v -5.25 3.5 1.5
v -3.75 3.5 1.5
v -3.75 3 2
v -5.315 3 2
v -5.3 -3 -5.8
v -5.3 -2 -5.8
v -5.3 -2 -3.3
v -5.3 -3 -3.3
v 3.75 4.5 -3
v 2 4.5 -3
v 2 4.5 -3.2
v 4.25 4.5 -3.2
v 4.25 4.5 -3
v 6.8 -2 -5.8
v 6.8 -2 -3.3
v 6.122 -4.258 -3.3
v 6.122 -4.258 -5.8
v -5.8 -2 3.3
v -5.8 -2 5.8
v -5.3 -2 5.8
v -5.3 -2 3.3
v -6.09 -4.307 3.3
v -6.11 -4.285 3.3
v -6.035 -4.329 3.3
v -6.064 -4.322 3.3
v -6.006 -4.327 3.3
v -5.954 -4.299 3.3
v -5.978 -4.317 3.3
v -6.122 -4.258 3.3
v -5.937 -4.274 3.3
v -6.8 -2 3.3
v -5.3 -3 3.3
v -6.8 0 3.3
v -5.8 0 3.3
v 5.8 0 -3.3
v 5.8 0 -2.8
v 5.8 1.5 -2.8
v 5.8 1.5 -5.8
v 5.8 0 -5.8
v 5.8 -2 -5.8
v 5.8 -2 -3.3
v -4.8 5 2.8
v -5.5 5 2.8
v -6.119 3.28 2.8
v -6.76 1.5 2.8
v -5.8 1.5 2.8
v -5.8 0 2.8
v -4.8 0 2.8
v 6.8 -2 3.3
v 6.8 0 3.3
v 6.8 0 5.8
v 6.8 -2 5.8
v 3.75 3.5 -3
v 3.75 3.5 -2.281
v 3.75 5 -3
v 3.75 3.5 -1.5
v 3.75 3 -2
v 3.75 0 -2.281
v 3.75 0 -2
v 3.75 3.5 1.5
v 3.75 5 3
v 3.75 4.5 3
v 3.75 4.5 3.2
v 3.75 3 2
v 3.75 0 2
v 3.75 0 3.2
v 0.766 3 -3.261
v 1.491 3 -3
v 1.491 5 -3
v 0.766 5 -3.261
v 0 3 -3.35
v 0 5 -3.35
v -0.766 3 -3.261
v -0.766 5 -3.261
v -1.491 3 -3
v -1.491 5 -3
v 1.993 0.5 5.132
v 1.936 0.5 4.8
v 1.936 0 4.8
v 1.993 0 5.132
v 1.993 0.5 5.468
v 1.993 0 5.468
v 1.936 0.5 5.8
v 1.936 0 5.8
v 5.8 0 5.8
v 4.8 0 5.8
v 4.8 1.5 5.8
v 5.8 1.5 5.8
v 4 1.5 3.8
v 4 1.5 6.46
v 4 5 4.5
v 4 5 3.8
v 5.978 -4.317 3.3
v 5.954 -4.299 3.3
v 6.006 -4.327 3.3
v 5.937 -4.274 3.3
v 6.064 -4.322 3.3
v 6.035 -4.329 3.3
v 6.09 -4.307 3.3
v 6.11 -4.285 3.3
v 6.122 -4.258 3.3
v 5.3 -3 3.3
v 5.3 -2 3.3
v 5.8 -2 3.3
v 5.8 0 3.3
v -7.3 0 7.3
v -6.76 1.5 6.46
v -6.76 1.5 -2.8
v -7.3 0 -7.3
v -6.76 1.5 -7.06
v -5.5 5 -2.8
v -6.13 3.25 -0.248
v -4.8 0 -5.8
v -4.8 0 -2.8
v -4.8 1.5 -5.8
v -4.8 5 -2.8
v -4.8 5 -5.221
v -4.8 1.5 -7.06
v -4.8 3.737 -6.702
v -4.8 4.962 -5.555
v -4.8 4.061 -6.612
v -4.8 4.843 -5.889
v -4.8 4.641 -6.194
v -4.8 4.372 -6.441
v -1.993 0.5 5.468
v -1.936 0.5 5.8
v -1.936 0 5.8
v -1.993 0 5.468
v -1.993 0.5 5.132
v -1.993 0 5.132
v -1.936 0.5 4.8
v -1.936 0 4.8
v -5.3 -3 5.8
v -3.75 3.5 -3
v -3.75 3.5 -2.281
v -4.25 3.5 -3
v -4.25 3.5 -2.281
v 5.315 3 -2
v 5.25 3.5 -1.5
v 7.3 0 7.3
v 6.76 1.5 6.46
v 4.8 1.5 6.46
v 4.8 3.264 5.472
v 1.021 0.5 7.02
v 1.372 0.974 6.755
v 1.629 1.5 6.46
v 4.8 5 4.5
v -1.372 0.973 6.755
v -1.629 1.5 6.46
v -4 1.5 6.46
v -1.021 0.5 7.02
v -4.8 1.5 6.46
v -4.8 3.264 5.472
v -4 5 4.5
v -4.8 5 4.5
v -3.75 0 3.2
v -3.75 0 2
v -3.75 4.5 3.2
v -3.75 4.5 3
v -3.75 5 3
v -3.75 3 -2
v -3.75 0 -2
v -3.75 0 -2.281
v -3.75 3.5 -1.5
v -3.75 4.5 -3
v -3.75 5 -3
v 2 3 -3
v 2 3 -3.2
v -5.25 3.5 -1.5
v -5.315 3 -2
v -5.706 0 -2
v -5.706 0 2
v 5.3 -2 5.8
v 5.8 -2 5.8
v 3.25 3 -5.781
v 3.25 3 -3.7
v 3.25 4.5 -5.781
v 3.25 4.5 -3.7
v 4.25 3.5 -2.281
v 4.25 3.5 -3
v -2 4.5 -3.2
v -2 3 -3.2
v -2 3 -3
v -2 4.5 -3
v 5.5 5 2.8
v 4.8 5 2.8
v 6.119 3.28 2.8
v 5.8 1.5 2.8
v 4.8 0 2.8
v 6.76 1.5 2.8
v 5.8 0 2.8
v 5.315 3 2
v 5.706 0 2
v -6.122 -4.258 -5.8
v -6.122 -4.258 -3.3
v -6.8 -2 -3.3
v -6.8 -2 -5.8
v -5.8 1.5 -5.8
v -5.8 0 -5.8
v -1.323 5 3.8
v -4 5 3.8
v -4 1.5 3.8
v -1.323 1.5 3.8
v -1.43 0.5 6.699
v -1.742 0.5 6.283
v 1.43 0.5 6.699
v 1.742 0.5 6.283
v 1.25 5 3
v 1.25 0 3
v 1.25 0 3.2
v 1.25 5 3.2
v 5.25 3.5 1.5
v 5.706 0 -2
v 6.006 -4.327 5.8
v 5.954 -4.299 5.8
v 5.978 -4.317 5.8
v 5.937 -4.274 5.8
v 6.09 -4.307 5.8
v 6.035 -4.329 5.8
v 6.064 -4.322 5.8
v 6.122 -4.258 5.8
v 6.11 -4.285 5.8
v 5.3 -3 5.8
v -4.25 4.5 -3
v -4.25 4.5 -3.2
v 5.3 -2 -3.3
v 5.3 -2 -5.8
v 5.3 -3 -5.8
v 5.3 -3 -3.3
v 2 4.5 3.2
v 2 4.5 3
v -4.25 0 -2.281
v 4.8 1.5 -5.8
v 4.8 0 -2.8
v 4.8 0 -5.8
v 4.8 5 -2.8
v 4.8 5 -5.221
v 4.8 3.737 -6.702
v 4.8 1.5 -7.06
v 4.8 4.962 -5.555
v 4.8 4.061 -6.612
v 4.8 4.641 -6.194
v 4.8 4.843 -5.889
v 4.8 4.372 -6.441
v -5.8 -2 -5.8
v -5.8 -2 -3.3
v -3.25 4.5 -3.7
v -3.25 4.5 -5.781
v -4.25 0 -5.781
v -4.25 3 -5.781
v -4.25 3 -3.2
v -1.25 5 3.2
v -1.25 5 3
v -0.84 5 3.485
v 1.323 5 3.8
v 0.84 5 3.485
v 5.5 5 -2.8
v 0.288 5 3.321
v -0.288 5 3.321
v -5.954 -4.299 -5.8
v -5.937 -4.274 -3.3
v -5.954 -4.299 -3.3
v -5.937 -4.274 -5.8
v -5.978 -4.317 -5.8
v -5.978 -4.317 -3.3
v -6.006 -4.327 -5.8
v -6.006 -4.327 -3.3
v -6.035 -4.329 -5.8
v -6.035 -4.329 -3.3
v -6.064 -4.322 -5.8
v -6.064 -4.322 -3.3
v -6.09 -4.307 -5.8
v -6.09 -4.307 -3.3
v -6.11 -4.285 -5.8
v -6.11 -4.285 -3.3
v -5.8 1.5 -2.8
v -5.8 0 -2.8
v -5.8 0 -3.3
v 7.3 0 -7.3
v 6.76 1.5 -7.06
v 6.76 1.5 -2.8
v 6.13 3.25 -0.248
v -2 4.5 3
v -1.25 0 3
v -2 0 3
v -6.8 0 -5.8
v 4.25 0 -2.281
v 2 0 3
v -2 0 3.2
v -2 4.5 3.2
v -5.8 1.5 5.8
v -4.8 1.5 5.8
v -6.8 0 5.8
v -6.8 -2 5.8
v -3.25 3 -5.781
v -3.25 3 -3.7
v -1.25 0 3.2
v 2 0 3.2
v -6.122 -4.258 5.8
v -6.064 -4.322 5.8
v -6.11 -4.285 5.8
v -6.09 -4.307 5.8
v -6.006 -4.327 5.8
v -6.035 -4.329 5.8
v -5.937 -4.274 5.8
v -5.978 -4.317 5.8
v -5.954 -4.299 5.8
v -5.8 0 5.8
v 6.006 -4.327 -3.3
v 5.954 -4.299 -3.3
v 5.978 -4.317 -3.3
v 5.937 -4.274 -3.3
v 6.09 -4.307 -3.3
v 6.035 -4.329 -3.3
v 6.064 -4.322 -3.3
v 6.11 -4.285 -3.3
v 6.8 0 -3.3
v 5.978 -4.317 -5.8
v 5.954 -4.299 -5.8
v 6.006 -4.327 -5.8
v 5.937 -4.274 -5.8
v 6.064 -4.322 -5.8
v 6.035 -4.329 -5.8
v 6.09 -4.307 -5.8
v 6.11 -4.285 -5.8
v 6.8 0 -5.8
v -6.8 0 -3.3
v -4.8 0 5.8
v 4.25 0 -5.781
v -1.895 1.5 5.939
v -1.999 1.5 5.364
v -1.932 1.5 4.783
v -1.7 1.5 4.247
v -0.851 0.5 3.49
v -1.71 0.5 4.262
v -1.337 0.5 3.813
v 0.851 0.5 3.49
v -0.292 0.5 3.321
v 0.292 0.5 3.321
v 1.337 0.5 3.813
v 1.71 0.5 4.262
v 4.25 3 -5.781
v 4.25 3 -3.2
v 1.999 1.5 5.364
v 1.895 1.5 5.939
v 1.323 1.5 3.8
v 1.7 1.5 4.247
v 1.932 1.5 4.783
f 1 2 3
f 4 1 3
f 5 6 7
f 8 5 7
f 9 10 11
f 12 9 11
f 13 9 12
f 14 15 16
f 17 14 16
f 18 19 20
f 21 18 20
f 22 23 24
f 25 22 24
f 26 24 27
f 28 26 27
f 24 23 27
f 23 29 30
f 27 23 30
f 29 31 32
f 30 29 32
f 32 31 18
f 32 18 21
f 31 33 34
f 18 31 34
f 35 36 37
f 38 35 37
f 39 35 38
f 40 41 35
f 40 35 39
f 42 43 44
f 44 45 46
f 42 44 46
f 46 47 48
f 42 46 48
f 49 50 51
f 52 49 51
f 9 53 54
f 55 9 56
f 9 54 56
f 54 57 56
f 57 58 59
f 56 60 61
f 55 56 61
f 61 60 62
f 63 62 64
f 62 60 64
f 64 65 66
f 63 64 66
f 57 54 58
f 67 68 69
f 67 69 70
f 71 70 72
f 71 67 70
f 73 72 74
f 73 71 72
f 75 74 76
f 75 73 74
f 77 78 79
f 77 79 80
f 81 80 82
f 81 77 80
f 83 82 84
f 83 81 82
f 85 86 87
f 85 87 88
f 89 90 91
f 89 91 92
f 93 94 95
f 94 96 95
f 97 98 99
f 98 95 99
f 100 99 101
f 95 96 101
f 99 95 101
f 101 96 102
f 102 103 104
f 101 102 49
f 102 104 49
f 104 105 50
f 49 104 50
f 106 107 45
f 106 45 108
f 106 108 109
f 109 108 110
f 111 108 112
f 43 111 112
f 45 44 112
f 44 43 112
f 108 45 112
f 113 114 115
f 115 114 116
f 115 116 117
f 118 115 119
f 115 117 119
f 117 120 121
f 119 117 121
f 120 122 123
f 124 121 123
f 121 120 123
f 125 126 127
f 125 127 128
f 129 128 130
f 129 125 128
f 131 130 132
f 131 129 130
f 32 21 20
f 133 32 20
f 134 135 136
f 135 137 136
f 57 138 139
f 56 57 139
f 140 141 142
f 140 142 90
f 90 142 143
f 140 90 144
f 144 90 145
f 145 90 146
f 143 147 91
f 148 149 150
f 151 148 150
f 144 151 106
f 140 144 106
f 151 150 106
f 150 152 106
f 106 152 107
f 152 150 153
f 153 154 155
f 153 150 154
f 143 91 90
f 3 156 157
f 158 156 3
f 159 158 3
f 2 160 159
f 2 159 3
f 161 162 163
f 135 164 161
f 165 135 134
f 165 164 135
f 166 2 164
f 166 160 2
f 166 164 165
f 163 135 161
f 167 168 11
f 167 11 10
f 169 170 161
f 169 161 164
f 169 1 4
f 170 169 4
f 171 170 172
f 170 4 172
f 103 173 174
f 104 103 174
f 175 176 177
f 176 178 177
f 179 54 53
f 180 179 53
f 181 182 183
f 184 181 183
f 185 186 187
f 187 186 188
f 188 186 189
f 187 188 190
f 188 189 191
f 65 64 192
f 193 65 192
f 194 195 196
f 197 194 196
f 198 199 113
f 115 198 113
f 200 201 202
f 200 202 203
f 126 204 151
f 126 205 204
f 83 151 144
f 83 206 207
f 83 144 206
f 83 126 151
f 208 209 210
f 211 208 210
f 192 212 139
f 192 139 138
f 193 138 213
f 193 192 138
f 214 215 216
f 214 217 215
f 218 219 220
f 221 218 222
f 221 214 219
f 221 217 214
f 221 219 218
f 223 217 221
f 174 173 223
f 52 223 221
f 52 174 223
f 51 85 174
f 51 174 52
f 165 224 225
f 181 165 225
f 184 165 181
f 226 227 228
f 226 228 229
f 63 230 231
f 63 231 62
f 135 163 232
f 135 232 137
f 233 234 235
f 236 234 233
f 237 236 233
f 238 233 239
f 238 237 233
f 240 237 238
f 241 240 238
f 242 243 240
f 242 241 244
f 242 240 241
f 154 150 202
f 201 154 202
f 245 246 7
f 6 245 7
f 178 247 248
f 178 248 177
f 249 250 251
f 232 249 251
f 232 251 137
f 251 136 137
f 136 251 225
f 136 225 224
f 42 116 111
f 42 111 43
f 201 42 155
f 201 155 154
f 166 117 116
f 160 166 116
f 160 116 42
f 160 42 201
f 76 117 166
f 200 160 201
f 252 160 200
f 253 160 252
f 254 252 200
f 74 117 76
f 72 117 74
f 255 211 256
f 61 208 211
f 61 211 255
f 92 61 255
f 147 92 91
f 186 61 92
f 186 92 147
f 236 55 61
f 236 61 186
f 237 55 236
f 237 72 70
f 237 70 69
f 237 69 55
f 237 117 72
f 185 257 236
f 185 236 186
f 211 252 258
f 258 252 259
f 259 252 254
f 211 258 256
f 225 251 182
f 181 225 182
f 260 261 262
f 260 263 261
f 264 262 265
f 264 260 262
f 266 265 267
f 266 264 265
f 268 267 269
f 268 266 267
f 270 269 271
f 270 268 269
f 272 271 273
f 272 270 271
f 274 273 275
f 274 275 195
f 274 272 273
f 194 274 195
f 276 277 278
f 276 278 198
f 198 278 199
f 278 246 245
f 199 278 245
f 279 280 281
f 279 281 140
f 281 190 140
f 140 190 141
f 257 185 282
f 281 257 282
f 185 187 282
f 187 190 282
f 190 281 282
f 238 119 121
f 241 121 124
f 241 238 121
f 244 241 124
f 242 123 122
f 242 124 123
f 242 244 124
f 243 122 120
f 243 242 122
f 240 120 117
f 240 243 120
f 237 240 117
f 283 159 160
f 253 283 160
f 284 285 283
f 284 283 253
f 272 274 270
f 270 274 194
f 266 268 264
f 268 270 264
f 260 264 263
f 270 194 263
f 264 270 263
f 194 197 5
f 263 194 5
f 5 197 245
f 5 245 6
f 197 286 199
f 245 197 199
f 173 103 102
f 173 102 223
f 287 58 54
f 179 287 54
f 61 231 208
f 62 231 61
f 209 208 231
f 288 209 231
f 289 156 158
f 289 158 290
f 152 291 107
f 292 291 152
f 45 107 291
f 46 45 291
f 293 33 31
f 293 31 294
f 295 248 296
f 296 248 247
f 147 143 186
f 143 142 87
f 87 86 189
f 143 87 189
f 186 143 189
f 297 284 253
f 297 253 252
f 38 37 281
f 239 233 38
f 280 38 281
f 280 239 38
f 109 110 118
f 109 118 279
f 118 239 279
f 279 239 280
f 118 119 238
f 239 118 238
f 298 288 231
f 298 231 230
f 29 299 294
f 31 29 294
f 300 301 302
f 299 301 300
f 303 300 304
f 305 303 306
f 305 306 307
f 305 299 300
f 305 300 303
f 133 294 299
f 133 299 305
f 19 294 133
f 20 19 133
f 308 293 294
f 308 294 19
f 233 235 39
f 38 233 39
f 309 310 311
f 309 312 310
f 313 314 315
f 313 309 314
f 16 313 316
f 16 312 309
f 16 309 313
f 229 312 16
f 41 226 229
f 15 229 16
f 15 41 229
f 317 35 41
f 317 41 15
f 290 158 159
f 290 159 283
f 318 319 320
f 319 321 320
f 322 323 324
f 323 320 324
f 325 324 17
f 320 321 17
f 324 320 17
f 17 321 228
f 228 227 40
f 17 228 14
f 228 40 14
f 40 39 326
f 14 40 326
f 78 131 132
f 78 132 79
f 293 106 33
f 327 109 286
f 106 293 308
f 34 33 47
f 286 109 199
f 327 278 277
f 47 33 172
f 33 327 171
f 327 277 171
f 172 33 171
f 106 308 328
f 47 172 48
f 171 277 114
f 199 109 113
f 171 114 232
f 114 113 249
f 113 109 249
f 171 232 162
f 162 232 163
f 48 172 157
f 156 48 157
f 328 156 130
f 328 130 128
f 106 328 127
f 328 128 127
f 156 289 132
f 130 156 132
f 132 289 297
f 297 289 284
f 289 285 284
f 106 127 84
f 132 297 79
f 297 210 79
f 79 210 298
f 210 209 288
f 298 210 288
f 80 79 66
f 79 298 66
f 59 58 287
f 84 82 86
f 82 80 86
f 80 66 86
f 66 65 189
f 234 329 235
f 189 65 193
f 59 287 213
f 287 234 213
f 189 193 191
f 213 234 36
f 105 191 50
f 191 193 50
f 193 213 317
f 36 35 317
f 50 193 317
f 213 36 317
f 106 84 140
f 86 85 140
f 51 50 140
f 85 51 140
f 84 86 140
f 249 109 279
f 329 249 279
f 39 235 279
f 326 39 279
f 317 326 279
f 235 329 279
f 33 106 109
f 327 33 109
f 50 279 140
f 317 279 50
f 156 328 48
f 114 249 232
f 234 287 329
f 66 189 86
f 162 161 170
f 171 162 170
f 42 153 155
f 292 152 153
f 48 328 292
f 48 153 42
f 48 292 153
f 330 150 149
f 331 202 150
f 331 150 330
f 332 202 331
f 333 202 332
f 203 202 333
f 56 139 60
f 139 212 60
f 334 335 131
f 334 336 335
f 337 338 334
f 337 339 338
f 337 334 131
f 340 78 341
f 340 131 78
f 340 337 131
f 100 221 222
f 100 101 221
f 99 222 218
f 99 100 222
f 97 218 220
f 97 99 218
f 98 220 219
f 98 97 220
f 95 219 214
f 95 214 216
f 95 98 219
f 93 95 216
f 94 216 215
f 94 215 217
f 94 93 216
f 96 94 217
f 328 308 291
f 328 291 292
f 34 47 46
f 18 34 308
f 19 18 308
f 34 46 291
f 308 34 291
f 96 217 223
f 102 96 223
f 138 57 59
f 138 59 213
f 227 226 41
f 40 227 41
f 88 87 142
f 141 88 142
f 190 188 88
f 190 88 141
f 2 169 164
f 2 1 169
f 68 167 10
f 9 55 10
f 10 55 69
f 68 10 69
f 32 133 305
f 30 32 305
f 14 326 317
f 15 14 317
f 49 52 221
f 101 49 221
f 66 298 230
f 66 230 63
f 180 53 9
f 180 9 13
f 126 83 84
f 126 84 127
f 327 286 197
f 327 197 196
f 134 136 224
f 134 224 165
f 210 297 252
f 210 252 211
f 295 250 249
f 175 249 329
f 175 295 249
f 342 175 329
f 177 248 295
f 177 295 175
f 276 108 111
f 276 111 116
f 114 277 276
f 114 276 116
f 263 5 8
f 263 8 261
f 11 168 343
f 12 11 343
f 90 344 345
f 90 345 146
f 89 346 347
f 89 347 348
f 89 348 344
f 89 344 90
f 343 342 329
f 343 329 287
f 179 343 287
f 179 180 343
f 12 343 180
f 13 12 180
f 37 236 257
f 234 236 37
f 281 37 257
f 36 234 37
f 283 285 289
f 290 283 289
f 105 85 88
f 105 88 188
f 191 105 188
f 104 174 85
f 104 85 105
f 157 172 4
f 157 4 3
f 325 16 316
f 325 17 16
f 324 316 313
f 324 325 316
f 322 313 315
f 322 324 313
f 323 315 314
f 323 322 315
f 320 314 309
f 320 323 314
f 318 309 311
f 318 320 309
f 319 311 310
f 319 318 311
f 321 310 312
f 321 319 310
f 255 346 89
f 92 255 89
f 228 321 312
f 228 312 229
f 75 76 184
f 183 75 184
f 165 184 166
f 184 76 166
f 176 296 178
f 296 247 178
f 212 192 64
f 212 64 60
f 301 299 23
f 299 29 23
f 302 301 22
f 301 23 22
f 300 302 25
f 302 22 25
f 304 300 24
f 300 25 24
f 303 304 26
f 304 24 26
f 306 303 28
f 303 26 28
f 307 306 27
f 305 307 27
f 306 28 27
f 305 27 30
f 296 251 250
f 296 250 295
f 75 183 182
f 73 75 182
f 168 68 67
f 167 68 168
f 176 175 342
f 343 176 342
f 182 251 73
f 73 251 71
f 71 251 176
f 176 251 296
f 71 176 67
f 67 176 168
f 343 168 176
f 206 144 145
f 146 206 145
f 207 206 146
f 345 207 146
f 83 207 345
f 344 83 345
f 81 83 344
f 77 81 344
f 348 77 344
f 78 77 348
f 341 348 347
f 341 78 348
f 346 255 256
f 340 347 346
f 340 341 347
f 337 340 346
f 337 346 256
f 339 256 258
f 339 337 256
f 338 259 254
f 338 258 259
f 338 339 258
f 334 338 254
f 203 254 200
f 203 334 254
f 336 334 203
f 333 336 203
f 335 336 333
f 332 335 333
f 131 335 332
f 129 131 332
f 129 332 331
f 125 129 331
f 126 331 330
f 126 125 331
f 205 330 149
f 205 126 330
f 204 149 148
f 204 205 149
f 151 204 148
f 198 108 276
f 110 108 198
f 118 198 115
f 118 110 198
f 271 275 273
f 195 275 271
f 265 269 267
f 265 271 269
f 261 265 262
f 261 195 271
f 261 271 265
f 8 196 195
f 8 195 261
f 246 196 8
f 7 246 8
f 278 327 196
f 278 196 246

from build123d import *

# Parameters (mm, degrees)
FILLET1_R               = 1.5
SKETCH4_W               = 2.5
SKETCH4_H               = 4.5
SKETCH4_W_2             = 8
SKETCH4_H_2             = 3.5
CUT_EXTRUDE1_DEPTH      = 3.5
SKETCH3_W               = 7.5
SKETCH3_H               = 6
CUT_EXTRUDE2_DEPTH      = 12.470832747
CUT_EXTRUDE5_DEPTH      = 11.900917559
CUT_EXTRUDE5_DEPTH_BACK = 1
SKETCH5_R               = 2
CUT_EXTRUDE6_START      = -0.5
CUT_EXTRUDE6_DEPTH      = 1.5
SKETCH9_W               = 1
SKETCH9_H               = 3
CUT_EXTRUDE9_DEPTH      = 12.470832747
CUT_EXTRUDE10_DEPTH     = 0.7
CUT_EXTRUDE11_DEPTH     = 0.7
CUT_EXTRUDE12_DEPTH     = 4
BOSS_EXTRUDE1_DEPTH     = 2
BOSS_EXTRUDE2_DEPTH     = 2
CUT_EXTRUDE17_DEPTH     = 0.45
CUT_EXTRUDE18_DEPTH     = 0.45
CUT_EXTRUDE19_DEPTH     = 0.5
CUT_EXTRUDE20_DEPTH     = 0.5
CUT_EXTRUDE22_START     = -3.5
SKETCH29_W              = 8.5
SKETCH29_H              = 3.5
CUT_EXTRUDE22_DEPTH     = 3.5
BOSS_EXTRUDE6_DEPTH     = 0.5
SKETCH33_W              = 2.25
SKETCH33_H              = 0.2
CUT_EXTRUDE23_DEPTH     = 1.5
SKETCH35_W              = 6.5
SKETCH35_H              = 2.080921332
CUT_EXTRUDE24_DEPTH     = 1
CUT_EXTRUDE25_DEPTH     = 11.750814086
SKETCH37_W              = 1.75
SKETCH37_H              = 0.2
CUT_EXTRUDE26_DEPTH     = 4.5
SKETCH38_W              = 2.5
SKETCH38_H              = 0.2
CUT_EXTRUDE27_DEPTH     = 12.470832747
SKETCH39_W              = 1
SKETCH39_H              = 2.5
BOSS_EXTRUDE9_DEPTH     = 2
SKETCH40_W              = 1.5
SKETCH40_H              = 2.5
BOSS_EXTRUDE10_DEPTH    = 2.5
CUT_EXTRUDE28_DEPTH     = 16.808225868
FILLET3_R               = 0.1


with BuildPart() as part:
    # Sketch1 → Loft1 section 0
    with BuildSketch(Plane(origin=(0, 0, 0), x_dir=(1, 0, 0), z_dir=(0, 1, 0))):
        with BuildLine():
            Line((-7.3, 7.3), (7.3, 7.3))
            Line((7.3, 7.3), (7.3, -7.3))
            Line((7.3, -7.3), (-7.3, -7.3))
            Line((-7.3, -7.3), (-7.3, 7.3))
        make_face()
    # Sketch2 → Loft1 section 1
    with BuildSketch(Plane(origin=(0, 5, 0), x_dir=(1, 0, 0), z_dir=(0, 1, 0))):
        with BuildLine():
            Line((-5.5, 6.5), (5.5, 6.5))
            Line((5.5, 6.5), (5.5, -4.5))
            Line((5.5, -4.5), (-5.5, -4.5))
            Line((-5.5, -4.5), (-5.5, 6.5))
        make_face()
    loft()

    # Fillet1
    fillet1_edges = [part.edges().sort_by_distance(p)[0] for p in [
        (0, 5, -6.5),
    ]]
    fillet(fillet1_edges, radius=FILLET1_R)

    # Sketch4 → Cut-Extrude1 (cut)
    with BuildSketch(Plane(origin=(0, 5, 0), x_dir=(1, 0, 0), z_dir=(0, 1, 0))):
        with Locations((-6.05, -5.05)):
            Rectangle(SKETCH4_W, SKETCH4_H)
        with Locations((6.05, 5.05)):
            Rectangle(SKETCH4_W, SKETCH4_H)
        with Locations((-6.05, 5.05)):
            Rectangle(SKETCH4_W, SKETCH4_H)
        with Locations((6.05, -5.05)):
            Rectangle(SKETCH4_W, SKETCH4_H)
        with Locations((0, -5.55)):
            Rectangle(SKETCH4_W_2, SKETCH4_H_2)
    extrude(amount=-CUT_EXTRUDE1_DEPTH, mode=Mode.SUBTRACT)

    # Shell2: read off the stored shape, not the designer's step
    # Shell2: loft between two sections, ruled curve by curve
    shell2_from = [
        Edge.make_line((5.705760369, 0, 1.3), (5.705760369, 0, -1.3)),
        Edge.make_line((-3.3, 0, -5.780921332), (3.3, 0, -5.780921332)),
        Edge.make_line((-5.705760369, 0, 1.3), (-5.705760369, 0, -1.3)),
        Edge.make_line((5.705760369, 0, -1.3), (3.3, 0, -1.3)),
        Edge.make_line((-5.705760369, 0, -1.3), (-3.3, 0, -1.3)),
        Edge.make_line((3.3, 0, -5.780921332), (3.3, 0, -1.3)),
        Edge.make_line((3.3, 0, 1.3), (3.3, 0, 2.3)),
        Edge.make_line((-3.3, 0, -5.780921332), (-3.3, 0, -1.3)),
        Edge.make_line((-3.3, 0, 2.3), (-3.3, 0, 1.3)),
        Edge.make_line((-3.3, 0, 1.3), (-5.705760369, 0, 1.3)),
        Edge.make_line((5.705760369, 0, 1.3), (3.3, 0, 1.3)),
        Edge.make_line((3.3, 0, 2.3), (-3.3, 0, 2.3)),
    ]
    shell2_to = [
        Edge.make_line((4.445760369, 3.5, 1.3), (4.445760369, 3.5, -1.3)),
        Edge.make_line((-3.3, 3.5, -5.220921332), (3.3, 3.5, -5.220921332)),
        Edge.make_line((-4.445760369, 3.5, 1.3), (-4.445760369, 3.5, -1.3)),
        Edge.make_line((4.445760369, 3.5, -1.3), (3.3, 3.5, -1.3)),
        Edge.make_line((-4.445760369, 3.5, -1.3), (-3.3, 3.5, -1.3)),
        Edge.make_line((3.3, 3.5, -5.220921332), (3.3, 3.5, -1.3)),
        Edge.make_line((3.3, 3.5, 1.3), (3.3, 3.5, 2.3)),
        Edge.make_line((-3.3, 3.5, -5.220921332), (-3.3, 3.5, -1.3)),
        Edge.make_line((-3.3, 3.5, 2.3), (-3.3, 3.5, 1.3)),
        Edge.make_line((-3.3, 3.5, 1.3), (-4.445760369, 3.5, 1.3)),
        Edge.make_line((4.445760369, 3.5, 1.3), (3.3, 3.5, 1.3)),
        Edge.make_line((3.3, 3.5, 2.3), (-3.3, 3.5, 2.3)),
    ]
    shell2 = Solid(Shell([*[Face.make_surface_from_curves(shell2_from[k], shell2_to[k]) for k in range(12)], Face(Wire(shell2_from)), Face(Wire(shell2_to))]))
    add(shell2, mode=Mode.SUBTRACT)

    # Sketch3 → Cut-Extrude2 (cut, through all)
    with BuildSketch(Plane.XZ):
        Rectangle(SKETCH3_W, SKETCH3_H)
    extrude(amount=-CUT_EXTRUDE2_DEPTH, mode=Mode.SUBTRACT)

    # Sketch5 → Cut-Extrude5 (cut, two sides: drawn at the far end of the back side and taken through both)
    with BuildSketch(Plane(origin=(0, 1.5, 0), x_dir=(1, 0, 0), z_dir=(0, 1, 0)).offset(-CUT_EXTRUDE5_DEPTH_BACK)):
        with Locations((0, -5.3)):
            Circle(SKETCH5_R)
    extrude(amount=CUT_EXTRUDE5_DEPTH + CUT_EXTRUDE5_DEPTH_BACK, mode=Mode.SUBTRACT)

    # Cut-Extrude6: read off the stored shape, not the designer's step
    # Cut-Extrude6 outline → Cut-Extrude6 (cut)
    with BuildSketch(Plane.XZ.offset(CUT_EXTRUDE6_START)):
        with BuildLine():
            Line((1.936491673, 5.8), (-1.936491673, 5.8))
            ThreePointArc((-1.936491673, 5.8), (-2, 5.3), (-1.936491673, 4.8))
            Line((-1.936491673, 4.8), (1.936491673, 4.8))
            ThreePointArc((1.936491673, 4.8), (2, 5.3), (1.936491673, 5.8))
        make_face()
    extrude(amount=CUT_EXTRUDE6_DEPTH, mode=Mode.SUBTRACT)

    # Sketch9 → Cut-Extrude9 (cut, through all)
    with BuildSketch(Plane(origin=(0, 0, 0), x_dir=(1, 0, 0), z_dir=(0, 1, 0))):
        with Locations((-5.3, 4.3)):
            Rectangle(SKETCH9_W, SKETCH9_H)
        with Locations((5.3, 4.3)):
            Rectangle(SKETCH9_W, SKETCH9_H)
        with Locations((-5.3, -4.3)):
            Rectangle(SKETCH9_W, SKETCH9_H)
        with Locations((5.3, -4.3)):
            Rectangle(SKETCH9_W, SKETCH9_H)
    extrude(amount=CUT_EXTRUDE9_DEPTH, mode=Mode.SUBTRACT)

    # Sketch11 → Cut-Extrude10 (cut)
    with BuildSketch(Plane(origin=(0, 0, 1.3), x_dir=(-1, 0, 0), z_dir=(0, 0, -1))):
        Polygon((-3.75, 0), (-5.705760369, 0), (-4.445760369, 3.5), (-3.75, 3.5), align=None)
        Polygon((3.75, 0), (3.75, 3.5), (4.445760369, 3.5), (5.705760369, 0), align=None)
    extrude(amount=-CUT_EXTRUDE10_DEPTH, mode=Mode.SUBTRACT)

    # Sketch12 → Cut-Extrude11 (cut)
    with BuildSketch(Plane.XY.offset(-1.3)):
        Polygon((3.75, 0), (5.705760369, 0), (4.445760369, 3.5), (3.75, 3.5), align=None)
        Polygon((-3.75, 0), (-5.705760369, 0), (-4.445760369, 3.5), (-3.75, 3.5), align=None)
    extrude(amount=-CUT_EXTRUDE11_DEPTH, mode=Mode.SUBTRACT)

    # Sketch13 → Cut-Extrude12 (cut)
    with BuildSketch(Plane(origin=(0, 0, 2), x_dir=(-1, 0, 0), z_dir=(0, 0, -1))):
        Polygon((3.75, 3.5), (5.25, 3.5), (5.705760369, 0), (3.75, 0), align=None)
        Polygon((-3.75, 3.5), (-5.25, 3.5), (-5.705760369, 0), (-3.75, 0), align=None)
    extrude(amount=CUT_EXTRUDE12_DEPTH, mode=Mode.SUBTRACT)

    # Sketch14 → Boss-Extrude1 (add)
    with BuildSketch(Plane(origin=(-3.75, 0, 0), x_dir=(0, 0, -1), z_dir=(1, 0, 0))):
        Polygon((-2, 3.5), (-1.5, 3.5), (-2, 3), align=None)
        Polygon((1.5, 3.5), (2, 3.5), (2, 3), align=None)
    extrude(amount=-BOSS_EXTRUDE1_DEPTH)

    # Sketch15 → Boss-Extrude2 (add)
    with BuildSketch(Plane.ZY.offset(-3.75)):
        Polygon((2, 3.5), (2, 3), (1.5, 3.5), align=None)
        Polygon((-2, 3.5), (-2, 3), (-1.5, 3.5), align=None)
    extrude(amount=-BOSS_EXTRUDE2_DEPTH)

    # Sketch18 → Cut-Extrude17 (cut)
    with BuildSketch(Plane(origin=(-3.3, 0, 0), x_dir=(0, 0, -1), z_dir=(1, 0, 0))):
        Polygon((5.220921332, 3.5), (3, 3.5), (3, 0), (5.780921332, 0), align=None)
    extrude(amount=-CUT_EXTRUDE17_DEPTH, mode=Mode.SUBTRACT)

    # Sketch19 → Cut-Extrude18 (cut)
    with BuildSketch(Plane.ZY.offset(-3.3)):
        Polygon((-5.780921332, 0), (-3, 0), (-3, 3.5), (-5.220921332, 3.5), align=None)
    extrude(amount=-CUT_EXTRUDE18_DEPTH, mode=Mode.SUBTRACT)

    # Sketch22 → Cut-Extrude19 (cut)
    with BuildSketch(Plane(origin=(-3.75, 0, 0), x_dir=(0, 0, -1), z_dir=(1, 0, 0))):
        Polygon((5.780921332, 0), (2.280921332, 0), (2.280921332, 3.5), (5.220921332, 3.5), align=None)
    extrude(amount=-CUT_EXTRUDE19_DEPTH, mode=Mode.SUBTRACT)

    # Sketch23 → Cut-Extrude20 (cut)
    with BuildSketch(Plane.ZY.offset(-3.75)):
        Polygon((-5.780921332, 0), (-2.280921332, 0), (-2.280921332, 3.5), (-5.220921332, 3.5), align=None)
    extrude(amount=-CUT_EXTRUDE20_DEPTH, mode=Mode.SUBTRACT)

    # Sketch29 → Cut-Extrude22 (cut)
    with BuildSketch(Plane.XZ.offset(CUT_EXTRUDE22_START)):
        with Locations((0, -4.030921332)):
            Rectangle(SKETCH29_W, SKETCH29_H)
    extrude(amount=CUT_EXTRUDE22_DEPTH, mode=Mode.SUBTRACT)

    # Sketch31 → Boss-Extrude6 (add)
    with BuildSketch(Plane.XZ.offset(-3.5)):
        Polygon((-4.25, -3), (-4.25, -5.780921332), (-3.25, -5.780921332), (-3.25, -3.7), (3.25, -3.7), (3.25, -5.780921332), (4.25, -5.780921332), (4.25, -3), (3.75, -3), (-3.75, -3), align=None)
    extrude(amount=BOSS_EXTRUDE6_DEPTH)

    # Sketch33 → Cut-Extrude23 (cut)
    with BuildSketch(Plane.XZ.offset(-3)):
        with Locations((-3.125, -3.1)):
            Rectangle(SKETCH33_W, SKETCH33_H)
        with Locations((3.125, -3.1)):
            Rectangle(SKETCH33_W, SKETCH33_H)
    extrude(amount=-CUT_EXTRUDE23_DEPTH, mode=Mode.SUBTRACT)

    # Sketch35 → Cut-Extrude24 (cut)
    with BuildSketch(Plane.XZ.offset(-3.5)):
        with Locations((0, -4.740460666)):
            Rectangle(SKETCH35_W, SKETCH35_H)
    extrude(amount=-CUT_EXTRUDE24_DEPTH, mode=Mode.SUBTRACT)

    # Sketch36 → Cut-Extrude25 (cut, through all)
    with BuildSketch(Plane.XZ.offset(-3)):
        with BuildLine():
            Line((-1.490805152, -3), (1.490805152, -3))
            ThreePointArc((1.490805152, -3), (0, -3.35), (-1.490805152, -3))
        make_face()
    extrude(amount=-CUT_EXTRUDE25_DEPTH, mode=Mode.SUBTRACT)

    # Sketch37 → Cut-Extrude26 (cut)
    with BuildSketch(Plane.XZ):
        with Locations((-2.875, 3.1)):
            Rectangle(SKETCH37_W, SKETCH37_H)
        with Locations((2.875, 3.1)):
            Rectangle(SKETCH37_W, SKETCH37_H)
    extrude(amount=-CUT_EXTRUDE26_DEPTH, mode=Mode.SUBTRACT)

    # Sketch38 → Cut-Extrude27 (cut, through all)
    with BuildSketch(Plane.XZ):
        with Locations((0, 3.1)):
            Rectangle(SKETCH38_W, SKETCH38_H)
    extrude(amount=-CUT_EXTRUDE27_DEPTH, mode=Mode.SUBTRACT)

    # Sketch39 → Boss-Extrude9 (add)
    with BuildSketch(Plane.XZ):
        with Locations((-6.3, 4.55)):
            Rectangle(SKETCH39_W, SKETCH39_H)
        with Locations((-6.3, -4.55)):
            Rectangle(SKETCH39_W, SKETCH39_H)
        with Locations((6.3, 4.55)):
            Rectangle(SKETCH39_W, SKETCH39_H)
        with Locations((6.3, -4.55)):
            Rectangle(SKETCH39_W, SKETCH39_H)
    extrude(amount=BOSS_EXTRUDE9_DEPTH)

    # Sketch40 → Boss-Extrude10 (add)
    with BuildSketch(Plane.XZ.offset(2)):
        with Locations((-6.05, 4.55)):
            Rectangle(SKETCH40_W, SKETCH40_H)
        with Locations((-6.05, -4.55)):
            Rectangle(SKETCH40_W, SKETCH40_H)
        with Locations((6.05, 4.55)):
            Rectangle(SKETCH40_W, SKETCH40_H)
        with Locations((6.05, -4.55)):
            Rectangle(SKETCH40_W, SKETCH40_H)
    extrude(amount=BOSS_EXTRUDE10_DEPTH)

    # Sketch41 → Cut-Extrude28 (cut, through all)
    with BuildSketch(Plane.XY.offset(5.8)):
        Polygon((-6.05, -4.5), (-6.8, -2), (-6.8, -4.5), align=None)
        Polygon((-5.3, -3), (-6.05, -4.5), (-5.3, -4.5), align=None)
        Polygon((5.3, -4.5), (6.05, -4.5), (5.3, -3), align=None)
        Polygon((6.8, -4.5), (6.8, -2), (6.05, -4.5), align=None)
    extrude(amount=-CUT_EXTRUDE28_DEPTH, mode=Mode.SUBTRACT)

    # Fillet3
    fillet3_edges = [part.edges().sort_by_distance(p)[0] for p in [
        (6.05, -4.5, -4.55),
        (-6.05, -4.5, -4.55),
        (-6.05, -4.5, 4.55),
        (6.05, -4.5, 4.55),
    ]]
    fillet(fillet3_edges, radius=FILLET3_R)


solid = part.part
